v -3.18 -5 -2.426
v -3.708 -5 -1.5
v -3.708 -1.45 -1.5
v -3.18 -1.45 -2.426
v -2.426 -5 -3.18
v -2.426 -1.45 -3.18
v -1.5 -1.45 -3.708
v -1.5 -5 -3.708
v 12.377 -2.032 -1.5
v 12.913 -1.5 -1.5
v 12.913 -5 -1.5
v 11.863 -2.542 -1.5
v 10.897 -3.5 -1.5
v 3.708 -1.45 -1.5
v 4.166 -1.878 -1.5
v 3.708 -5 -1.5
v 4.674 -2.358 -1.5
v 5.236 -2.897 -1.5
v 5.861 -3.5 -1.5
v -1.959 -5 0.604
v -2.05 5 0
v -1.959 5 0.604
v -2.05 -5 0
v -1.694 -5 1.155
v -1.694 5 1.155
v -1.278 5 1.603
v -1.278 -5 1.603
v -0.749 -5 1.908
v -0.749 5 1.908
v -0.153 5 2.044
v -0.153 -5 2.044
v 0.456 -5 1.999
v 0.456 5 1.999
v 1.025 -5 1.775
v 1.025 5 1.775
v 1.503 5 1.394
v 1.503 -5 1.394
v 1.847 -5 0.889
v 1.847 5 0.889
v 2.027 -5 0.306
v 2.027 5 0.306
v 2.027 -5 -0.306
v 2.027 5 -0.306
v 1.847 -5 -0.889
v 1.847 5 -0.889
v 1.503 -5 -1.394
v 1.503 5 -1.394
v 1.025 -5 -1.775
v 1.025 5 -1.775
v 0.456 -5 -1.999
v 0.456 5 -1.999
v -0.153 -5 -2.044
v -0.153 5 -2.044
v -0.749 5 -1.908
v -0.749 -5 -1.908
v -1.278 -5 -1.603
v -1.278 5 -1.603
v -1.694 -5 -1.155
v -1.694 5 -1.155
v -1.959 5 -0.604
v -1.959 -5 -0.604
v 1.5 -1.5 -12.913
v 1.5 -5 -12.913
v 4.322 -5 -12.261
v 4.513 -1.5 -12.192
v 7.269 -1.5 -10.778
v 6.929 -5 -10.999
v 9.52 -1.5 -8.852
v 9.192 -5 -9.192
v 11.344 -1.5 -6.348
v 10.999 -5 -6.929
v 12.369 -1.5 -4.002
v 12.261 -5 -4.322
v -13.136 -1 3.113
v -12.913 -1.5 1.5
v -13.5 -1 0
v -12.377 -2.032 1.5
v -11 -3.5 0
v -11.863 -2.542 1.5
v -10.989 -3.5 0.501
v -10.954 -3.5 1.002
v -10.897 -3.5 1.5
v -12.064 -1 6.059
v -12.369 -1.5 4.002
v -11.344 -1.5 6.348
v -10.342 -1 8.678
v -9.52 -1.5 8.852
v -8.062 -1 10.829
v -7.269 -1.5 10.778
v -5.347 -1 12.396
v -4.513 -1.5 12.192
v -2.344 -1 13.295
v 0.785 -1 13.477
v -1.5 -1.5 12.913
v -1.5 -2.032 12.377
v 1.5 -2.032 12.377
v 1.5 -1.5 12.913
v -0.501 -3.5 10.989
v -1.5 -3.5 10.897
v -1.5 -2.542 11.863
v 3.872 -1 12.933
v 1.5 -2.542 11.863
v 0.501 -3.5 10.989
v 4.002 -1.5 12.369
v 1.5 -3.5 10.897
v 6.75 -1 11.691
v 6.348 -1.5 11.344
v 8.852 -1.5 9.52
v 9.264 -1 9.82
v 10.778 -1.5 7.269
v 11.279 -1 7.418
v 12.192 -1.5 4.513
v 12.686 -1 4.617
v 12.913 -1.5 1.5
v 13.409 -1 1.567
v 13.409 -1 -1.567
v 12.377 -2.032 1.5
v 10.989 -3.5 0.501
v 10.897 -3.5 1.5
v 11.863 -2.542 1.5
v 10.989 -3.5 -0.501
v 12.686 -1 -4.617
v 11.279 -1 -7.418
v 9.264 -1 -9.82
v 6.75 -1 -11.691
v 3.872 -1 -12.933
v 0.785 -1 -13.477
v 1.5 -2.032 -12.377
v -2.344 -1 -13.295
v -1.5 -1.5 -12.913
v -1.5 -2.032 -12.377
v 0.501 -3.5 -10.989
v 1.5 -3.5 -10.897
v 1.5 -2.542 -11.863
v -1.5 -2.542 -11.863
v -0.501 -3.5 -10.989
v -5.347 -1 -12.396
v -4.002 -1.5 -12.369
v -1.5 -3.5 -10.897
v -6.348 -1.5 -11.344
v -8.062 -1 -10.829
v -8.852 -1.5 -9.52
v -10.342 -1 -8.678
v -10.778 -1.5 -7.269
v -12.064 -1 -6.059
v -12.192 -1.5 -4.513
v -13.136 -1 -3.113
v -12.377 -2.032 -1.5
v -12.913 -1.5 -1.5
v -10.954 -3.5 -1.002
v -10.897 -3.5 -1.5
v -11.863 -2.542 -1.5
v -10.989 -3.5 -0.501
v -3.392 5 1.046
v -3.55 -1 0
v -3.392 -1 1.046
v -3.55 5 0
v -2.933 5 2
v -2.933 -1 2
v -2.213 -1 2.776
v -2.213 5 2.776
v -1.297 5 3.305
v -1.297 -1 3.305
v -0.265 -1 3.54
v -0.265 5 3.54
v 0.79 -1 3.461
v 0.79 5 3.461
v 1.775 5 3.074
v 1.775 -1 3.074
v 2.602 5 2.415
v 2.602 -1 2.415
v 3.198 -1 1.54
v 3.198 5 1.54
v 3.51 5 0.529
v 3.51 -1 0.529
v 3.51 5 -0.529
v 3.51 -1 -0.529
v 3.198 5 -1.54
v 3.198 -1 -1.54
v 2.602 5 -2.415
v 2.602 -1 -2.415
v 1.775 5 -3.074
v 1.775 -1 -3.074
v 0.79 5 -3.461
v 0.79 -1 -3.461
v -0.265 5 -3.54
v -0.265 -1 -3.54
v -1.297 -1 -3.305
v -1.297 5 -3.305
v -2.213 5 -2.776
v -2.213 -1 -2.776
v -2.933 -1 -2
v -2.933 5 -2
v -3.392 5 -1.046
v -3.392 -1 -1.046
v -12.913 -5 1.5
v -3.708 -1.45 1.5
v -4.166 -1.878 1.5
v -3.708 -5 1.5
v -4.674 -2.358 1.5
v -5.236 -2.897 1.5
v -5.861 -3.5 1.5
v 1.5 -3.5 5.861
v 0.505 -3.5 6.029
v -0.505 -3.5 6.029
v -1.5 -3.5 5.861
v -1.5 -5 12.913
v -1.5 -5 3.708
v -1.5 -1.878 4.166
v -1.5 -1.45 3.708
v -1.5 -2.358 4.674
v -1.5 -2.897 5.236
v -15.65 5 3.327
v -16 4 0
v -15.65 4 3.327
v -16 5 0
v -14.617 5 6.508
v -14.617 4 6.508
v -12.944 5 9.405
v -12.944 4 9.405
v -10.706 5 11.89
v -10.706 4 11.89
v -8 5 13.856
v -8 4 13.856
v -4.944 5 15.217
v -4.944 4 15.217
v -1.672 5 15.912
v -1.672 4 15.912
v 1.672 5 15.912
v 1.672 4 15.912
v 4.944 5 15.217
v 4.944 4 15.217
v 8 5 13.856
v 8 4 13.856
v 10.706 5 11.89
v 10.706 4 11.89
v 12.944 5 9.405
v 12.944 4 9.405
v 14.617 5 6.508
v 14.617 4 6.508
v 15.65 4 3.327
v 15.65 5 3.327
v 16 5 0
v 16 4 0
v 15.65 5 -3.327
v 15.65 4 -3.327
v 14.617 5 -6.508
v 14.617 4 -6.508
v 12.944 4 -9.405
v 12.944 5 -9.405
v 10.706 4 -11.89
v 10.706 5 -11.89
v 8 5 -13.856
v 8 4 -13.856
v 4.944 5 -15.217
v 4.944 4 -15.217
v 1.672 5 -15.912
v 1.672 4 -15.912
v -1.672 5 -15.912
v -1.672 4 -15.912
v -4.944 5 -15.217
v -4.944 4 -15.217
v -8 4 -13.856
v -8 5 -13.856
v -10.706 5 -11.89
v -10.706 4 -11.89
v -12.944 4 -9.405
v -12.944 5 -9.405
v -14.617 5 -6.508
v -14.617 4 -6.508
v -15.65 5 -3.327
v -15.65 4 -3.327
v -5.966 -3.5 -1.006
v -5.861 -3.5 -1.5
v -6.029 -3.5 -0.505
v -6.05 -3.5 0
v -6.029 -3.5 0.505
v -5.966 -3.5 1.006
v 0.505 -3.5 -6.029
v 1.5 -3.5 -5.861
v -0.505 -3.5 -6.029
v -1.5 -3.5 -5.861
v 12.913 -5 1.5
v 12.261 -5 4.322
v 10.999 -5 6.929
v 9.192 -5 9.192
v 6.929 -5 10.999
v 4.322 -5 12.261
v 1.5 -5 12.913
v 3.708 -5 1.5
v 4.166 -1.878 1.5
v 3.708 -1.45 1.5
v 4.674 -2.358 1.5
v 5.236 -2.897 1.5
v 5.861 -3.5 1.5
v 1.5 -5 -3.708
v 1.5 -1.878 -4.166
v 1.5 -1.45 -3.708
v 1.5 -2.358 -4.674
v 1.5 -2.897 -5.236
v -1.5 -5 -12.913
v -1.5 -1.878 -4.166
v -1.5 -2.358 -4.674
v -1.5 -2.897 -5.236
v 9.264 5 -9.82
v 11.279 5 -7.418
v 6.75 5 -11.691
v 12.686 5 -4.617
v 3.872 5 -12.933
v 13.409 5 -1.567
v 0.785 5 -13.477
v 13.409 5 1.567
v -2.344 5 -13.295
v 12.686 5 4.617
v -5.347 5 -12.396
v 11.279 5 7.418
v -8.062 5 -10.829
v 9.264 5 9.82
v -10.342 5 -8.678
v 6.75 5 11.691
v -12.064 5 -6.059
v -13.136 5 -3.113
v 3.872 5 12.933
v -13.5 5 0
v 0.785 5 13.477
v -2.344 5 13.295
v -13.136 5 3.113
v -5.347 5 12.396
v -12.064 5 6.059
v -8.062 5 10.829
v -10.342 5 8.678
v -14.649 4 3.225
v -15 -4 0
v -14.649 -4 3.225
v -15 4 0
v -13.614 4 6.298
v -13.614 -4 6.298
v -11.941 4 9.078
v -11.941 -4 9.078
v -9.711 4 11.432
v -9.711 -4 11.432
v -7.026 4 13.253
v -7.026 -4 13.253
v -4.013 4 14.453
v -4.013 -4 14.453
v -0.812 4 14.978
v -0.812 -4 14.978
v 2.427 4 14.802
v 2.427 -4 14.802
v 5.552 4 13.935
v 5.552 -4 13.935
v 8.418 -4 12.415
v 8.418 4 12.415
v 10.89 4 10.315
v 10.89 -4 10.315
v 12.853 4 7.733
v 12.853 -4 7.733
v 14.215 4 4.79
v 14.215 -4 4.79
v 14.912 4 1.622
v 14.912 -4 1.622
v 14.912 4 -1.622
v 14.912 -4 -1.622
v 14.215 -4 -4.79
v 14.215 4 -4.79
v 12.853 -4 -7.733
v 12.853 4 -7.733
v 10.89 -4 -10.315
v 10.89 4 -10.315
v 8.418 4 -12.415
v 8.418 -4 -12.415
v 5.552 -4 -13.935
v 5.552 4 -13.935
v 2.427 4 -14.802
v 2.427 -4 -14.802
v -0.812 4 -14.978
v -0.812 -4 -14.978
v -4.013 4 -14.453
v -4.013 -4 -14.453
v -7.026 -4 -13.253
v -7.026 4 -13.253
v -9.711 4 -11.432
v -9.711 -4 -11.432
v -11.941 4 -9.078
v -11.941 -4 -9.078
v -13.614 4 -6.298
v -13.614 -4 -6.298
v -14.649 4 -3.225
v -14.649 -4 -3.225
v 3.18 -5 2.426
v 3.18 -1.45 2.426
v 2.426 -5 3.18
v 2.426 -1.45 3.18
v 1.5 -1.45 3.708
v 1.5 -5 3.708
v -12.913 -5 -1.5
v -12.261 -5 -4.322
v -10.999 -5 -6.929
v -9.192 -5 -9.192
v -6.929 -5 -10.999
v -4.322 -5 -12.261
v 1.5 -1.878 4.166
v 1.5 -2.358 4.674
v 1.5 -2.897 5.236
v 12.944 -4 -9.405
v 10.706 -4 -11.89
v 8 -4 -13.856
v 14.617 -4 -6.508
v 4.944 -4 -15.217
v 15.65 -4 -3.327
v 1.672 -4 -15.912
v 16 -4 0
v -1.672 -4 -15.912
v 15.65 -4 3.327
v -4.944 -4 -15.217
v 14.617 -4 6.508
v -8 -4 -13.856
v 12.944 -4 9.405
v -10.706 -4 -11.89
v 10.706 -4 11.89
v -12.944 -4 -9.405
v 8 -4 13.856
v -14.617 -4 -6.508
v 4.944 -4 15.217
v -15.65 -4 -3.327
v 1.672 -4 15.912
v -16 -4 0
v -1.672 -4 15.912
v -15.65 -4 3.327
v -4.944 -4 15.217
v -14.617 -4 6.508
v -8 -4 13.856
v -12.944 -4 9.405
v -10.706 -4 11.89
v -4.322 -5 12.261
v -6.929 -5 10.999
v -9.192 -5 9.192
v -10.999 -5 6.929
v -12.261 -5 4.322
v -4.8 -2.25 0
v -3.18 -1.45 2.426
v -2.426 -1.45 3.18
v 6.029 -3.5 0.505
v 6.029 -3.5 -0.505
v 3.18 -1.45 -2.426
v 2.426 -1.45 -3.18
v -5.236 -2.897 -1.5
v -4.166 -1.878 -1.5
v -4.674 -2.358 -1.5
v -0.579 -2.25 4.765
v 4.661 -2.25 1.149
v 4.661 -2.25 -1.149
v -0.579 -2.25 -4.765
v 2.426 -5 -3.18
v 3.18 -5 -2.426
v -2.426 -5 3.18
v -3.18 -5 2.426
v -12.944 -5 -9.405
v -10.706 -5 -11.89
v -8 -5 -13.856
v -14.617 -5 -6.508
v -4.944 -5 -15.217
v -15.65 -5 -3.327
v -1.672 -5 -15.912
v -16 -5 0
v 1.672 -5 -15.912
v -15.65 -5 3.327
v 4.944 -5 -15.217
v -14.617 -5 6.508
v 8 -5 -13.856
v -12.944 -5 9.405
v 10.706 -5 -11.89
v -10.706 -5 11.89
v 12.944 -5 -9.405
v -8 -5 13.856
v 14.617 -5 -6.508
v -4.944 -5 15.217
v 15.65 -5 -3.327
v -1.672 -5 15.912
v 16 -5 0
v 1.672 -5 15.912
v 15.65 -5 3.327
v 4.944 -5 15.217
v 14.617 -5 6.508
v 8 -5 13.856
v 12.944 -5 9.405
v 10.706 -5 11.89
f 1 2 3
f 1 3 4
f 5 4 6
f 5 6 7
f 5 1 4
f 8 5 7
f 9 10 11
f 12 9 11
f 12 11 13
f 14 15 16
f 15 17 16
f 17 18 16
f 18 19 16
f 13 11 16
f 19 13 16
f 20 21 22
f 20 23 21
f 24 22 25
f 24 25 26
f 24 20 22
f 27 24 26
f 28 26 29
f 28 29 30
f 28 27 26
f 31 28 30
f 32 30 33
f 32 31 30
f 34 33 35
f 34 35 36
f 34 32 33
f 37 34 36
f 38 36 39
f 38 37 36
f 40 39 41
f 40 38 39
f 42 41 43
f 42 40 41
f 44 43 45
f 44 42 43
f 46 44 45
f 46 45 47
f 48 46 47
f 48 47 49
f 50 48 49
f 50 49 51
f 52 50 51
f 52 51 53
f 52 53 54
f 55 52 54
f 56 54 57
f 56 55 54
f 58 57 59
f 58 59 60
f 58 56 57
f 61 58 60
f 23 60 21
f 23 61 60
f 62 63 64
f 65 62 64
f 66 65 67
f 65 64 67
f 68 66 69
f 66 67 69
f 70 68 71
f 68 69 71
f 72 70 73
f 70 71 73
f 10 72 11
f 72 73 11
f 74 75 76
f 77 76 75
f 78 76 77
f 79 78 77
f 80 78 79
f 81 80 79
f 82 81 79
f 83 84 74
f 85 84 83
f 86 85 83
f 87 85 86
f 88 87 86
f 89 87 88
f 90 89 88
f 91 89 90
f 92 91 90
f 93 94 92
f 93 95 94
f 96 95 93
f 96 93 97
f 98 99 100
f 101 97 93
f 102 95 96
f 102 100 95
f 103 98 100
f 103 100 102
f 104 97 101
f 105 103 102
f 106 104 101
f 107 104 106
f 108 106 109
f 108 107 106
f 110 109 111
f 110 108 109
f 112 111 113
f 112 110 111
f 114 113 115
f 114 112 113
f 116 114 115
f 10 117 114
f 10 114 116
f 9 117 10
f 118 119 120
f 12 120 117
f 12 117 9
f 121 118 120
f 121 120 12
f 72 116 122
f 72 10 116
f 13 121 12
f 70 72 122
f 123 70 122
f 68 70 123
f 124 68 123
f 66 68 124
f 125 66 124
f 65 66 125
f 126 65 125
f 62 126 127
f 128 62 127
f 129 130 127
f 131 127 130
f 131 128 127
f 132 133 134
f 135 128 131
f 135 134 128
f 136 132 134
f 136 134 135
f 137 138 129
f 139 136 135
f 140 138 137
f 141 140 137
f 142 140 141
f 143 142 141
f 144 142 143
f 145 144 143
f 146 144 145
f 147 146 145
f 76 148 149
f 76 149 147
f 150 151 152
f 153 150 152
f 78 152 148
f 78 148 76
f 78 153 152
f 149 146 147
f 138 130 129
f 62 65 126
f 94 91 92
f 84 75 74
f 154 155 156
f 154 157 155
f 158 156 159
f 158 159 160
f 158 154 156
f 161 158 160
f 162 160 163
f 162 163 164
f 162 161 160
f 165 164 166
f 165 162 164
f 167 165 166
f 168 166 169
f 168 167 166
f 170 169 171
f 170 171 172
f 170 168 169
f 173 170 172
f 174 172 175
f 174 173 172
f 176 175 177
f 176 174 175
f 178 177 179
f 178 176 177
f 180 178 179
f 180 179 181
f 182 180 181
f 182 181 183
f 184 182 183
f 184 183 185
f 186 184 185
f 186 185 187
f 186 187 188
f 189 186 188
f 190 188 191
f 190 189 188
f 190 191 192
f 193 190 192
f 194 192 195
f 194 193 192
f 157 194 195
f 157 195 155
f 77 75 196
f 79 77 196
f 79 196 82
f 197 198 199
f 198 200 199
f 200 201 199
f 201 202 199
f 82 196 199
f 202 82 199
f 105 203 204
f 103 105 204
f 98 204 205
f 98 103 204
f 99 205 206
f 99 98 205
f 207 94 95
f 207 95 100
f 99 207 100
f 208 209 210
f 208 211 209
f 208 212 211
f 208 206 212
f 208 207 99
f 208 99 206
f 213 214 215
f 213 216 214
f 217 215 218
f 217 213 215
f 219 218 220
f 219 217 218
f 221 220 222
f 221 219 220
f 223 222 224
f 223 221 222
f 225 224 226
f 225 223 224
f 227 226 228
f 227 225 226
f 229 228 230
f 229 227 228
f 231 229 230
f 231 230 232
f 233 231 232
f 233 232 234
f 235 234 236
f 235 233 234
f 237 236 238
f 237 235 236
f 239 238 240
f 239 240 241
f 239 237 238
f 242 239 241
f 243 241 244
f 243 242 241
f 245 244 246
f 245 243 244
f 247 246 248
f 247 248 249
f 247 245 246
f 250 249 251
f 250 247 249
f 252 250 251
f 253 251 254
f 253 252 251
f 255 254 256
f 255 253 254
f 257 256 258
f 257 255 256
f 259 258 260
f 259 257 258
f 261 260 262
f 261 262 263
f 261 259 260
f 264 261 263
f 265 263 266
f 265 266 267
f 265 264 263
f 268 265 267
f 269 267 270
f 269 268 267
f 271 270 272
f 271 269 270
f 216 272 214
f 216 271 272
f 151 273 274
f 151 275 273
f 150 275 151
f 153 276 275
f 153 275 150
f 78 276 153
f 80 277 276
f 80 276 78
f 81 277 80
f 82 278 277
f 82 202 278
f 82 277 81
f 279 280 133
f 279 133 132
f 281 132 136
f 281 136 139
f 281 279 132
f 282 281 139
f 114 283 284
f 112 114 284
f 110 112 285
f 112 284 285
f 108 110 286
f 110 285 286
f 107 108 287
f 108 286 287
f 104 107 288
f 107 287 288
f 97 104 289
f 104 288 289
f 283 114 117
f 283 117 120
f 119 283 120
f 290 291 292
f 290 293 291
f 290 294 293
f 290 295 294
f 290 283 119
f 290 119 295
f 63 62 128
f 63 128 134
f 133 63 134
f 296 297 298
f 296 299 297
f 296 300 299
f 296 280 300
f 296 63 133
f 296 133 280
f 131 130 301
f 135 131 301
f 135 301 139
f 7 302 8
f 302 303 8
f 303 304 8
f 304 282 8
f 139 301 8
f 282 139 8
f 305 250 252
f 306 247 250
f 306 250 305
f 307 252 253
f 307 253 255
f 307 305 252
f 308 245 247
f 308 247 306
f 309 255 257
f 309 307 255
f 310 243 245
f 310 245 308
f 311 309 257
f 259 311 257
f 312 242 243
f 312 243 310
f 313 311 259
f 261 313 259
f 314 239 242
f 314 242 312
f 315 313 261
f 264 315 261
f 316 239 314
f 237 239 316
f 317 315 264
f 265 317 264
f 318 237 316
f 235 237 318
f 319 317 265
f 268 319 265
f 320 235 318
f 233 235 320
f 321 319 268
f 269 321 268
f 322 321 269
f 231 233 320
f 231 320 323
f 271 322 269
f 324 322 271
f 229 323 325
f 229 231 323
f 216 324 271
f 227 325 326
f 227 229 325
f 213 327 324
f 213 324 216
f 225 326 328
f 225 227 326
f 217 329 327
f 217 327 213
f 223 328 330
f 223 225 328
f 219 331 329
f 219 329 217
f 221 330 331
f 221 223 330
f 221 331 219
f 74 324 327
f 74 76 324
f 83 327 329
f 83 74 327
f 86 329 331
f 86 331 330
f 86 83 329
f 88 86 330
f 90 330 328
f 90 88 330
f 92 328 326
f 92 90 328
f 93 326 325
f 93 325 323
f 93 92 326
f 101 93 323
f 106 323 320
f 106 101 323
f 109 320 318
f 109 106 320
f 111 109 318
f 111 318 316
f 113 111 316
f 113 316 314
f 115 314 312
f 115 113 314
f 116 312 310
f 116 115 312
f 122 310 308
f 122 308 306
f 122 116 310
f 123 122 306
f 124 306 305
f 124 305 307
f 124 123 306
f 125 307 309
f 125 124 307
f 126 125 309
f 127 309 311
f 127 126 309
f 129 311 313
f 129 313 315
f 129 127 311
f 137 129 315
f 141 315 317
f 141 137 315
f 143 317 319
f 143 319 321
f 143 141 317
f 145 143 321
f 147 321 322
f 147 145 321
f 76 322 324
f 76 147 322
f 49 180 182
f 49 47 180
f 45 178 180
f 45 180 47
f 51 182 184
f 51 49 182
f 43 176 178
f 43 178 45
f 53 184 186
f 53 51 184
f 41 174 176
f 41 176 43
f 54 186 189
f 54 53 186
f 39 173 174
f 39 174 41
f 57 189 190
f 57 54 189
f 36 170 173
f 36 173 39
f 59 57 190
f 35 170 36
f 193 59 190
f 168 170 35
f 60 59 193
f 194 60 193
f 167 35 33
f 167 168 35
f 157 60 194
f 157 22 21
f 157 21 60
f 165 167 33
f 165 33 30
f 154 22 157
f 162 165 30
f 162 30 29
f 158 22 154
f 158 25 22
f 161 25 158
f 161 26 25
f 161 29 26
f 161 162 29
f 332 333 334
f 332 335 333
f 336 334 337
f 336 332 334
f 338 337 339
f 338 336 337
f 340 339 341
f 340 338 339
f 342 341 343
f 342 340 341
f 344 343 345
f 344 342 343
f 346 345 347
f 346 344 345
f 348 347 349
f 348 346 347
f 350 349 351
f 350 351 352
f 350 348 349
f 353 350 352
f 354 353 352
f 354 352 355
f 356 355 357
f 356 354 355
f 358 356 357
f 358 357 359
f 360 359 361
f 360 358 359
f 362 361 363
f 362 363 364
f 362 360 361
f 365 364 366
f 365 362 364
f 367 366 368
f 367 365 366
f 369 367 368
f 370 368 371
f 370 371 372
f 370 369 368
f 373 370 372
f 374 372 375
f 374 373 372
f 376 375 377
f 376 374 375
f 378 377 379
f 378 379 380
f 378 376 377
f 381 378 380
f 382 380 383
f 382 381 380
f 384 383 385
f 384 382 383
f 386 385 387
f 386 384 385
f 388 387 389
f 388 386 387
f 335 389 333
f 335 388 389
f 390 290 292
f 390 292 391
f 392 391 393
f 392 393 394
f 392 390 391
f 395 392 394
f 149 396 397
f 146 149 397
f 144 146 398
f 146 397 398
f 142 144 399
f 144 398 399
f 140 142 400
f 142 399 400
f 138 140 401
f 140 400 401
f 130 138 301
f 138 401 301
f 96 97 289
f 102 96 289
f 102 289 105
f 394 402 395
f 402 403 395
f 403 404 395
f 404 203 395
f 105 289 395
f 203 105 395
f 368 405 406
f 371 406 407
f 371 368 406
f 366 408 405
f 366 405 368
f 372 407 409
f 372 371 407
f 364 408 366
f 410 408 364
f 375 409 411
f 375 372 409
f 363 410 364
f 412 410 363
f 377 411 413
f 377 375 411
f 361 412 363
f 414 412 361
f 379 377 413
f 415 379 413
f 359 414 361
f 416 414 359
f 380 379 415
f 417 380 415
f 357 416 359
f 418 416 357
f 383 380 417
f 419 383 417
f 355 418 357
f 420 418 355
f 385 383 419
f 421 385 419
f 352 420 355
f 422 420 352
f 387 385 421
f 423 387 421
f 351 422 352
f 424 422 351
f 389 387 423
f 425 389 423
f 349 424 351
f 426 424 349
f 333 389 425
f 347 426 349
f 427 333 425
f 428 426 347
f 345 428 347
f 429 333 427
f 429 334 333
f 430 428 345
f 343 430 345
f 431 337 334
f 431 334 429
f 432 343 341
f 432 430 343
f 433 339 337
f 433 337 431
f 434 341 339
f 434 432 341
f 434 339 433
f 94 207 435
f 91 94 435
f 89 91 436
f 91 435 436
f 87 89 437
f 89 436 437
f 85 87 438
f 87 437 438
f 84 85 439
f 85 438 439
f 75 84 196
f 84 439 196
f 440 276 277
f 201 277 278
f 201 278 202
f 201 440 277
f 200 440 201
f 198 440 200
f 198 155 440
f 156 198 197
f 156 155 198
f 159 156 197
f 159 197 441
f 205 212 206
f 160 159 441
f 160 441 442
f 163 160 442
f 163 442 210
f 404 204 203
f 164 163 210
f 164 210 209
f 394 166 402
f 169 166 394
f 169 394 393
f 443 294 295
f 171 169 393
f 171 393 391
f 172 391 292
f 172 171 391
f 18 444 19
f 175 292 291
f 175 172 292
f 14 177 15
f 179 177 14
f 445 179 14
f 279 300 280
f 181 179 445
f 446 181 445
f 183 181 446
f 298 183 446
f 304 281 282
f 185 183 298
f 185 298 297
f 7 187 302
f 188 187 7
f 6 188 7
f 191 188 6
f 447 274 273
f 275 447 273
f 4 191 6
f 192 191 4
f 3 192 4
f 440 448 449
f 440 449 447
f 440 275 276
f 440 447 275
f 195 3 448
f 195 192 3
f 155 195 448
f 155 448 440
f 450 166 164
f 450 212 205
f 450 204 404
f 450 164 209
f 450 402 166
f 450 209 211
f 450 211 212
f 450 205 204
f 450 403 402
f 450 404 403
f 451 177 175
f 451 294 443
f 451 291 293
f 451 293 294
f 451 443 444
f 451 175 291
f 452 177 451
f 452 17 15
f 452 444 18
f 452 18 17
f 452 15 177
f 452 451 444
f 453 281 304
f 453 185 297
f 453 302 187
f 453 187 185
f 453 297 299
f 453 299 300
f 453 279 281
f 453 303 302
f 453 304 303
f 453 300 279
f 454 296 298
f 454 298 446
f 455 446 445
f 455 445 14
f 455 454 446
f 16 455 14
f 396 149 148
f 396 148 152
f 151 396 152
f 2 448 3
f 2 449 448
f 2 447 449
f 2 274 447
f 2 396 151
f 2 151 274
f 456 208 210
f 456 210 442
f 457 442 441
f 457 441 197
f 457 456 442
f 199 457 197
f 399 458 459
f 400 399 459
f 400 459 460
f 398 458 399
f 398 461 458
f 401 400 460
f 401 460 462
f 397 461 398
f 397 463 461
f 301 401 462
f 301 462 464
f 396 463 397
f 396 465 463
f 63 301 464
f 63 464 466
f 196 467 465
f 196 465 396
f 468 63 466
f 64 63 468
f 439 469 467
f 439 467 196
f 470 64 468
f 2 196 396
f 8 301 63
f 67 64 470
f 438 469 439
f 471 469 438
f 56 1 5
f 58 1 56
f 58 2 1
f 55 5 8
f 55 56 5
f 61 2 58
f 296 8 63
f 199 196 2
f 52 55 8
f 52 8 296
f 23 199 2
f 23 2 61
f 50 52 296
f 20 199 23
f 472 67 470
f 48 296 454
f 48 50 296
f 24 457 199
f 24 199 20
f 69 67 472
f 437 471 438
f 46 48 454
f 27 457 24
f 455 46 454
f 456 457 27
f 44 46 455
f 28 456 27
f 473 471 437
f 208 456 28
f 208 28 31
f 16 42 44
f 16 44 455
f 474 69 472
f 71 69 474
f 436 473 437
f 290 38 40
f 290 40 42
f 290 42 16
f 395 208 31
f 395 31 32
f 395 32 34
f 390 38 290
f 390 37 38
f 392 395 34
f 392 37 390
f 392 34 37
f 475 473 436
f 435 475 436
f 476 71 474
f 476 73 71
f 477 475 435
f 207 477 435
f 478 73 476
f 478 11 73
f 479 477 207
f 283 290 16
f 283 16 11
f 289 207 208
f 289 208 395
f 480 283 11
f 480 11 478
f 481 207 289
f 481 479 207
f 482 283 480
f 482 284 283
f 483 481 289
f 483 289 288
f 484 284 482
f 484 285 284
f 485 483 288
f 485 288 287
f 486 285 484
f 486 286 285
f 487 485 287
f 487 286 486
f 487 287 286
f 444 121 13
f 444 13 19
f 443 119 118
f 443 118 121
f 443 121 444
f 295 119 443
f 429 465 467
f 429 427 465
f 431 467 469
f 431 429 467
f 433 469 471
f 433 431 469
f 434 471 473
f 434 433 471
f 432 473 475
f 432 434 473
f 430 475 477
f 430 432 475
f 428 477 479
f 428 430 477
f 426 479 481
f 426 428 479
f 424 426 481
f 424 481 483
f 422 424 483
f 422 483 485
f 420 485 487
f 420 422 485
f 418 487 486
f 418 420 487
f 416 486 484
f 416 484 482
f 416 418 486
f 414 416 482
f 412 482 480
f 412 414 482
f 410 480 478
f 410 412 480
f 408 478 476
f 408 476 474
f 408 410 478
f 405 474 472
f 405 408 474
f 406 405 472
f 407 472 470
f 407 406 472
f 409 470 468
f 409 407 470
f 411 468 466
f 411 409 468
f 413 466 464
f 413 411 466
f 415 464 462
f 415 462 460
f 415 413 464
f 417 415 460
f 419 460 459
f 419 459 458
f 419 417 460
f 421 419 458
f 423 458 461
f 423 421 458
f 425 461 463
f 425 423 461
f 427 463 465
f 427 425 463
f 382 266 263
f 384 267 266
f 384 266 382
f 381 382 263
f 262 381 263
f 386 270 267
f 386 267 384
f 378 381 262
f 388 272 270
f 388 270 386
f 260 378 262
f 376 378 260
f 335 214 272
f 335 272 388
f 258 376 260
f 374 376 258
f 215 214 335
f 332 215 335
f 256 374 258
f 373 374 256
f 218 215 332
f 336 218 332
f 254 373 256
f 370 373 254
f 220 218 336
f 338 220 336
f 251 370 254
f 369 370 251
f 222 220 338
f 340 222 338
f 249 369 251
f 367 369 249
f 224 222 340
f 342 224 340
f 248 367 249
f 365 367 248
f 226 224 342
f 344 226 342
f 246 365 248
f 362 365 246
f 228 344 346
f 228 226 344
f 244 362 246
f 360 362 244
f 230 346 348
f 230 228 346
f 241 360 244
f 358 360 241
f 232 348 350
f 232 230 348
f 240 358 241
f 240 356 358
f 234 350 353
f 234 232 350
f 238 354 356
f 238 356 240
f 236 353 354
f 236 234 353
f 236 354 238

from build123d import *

# Parameters (mm, degrees)
POCKET_DEPTH       = 5
POLARPATTERN_COUNT = 4


with BuildPart() as part:
    # Sketch → Revolution (revolve)
    with BuildSketch(Plane.XY):
        Polygon((-2.05, 5), (-2.05, -5), (-16, -5), (-16, -4), (-15, -4), (-15, 4), (-16, 4), (-16, 5), (-13.5, 5), (-13.5, -1), (-11, -3.5), (-6.05, -3.5), (-3.55, -1), (-3.55, 5), align=None)
    revolve(axis=Axis((0, 0, 0), (0, 1, 0)))

    # Sketch001 → Pocket (cut)
    with BuildSketch(Plane.XZ.offset(5)):
        with BuildLine():
            ThreePointArc((-1.5, 3.708099), (-2.828427, 2.828427), (-3.708099, 1.5))
            Line((-12.913172, 1.5), (-3.708099, 1.5))
            ThreePointArc((-1.5, 12.913172), (-9.192388, 9.192388), (-12.913172, 1.5))
            Line((-1.5, 12.913172), (-1.5, 3.708099))
        make_face()
    pocket = extrude(amount=-POCKET_DEPTH, mode=Mode.SUBTRACT)

    # PolarPattern: Pocket ×4 about axis
    polarpattern_axis = Axis((0, -5, 0), (0, -1, 0))
    for i in range(1, POLARPATTERN_COUNT):
        add(pocket.rotate(polarpattern_axis, i * 360 / POLARPATTERN_COUNT), mode=Mode.SUBTRACT)


solid = part.part
